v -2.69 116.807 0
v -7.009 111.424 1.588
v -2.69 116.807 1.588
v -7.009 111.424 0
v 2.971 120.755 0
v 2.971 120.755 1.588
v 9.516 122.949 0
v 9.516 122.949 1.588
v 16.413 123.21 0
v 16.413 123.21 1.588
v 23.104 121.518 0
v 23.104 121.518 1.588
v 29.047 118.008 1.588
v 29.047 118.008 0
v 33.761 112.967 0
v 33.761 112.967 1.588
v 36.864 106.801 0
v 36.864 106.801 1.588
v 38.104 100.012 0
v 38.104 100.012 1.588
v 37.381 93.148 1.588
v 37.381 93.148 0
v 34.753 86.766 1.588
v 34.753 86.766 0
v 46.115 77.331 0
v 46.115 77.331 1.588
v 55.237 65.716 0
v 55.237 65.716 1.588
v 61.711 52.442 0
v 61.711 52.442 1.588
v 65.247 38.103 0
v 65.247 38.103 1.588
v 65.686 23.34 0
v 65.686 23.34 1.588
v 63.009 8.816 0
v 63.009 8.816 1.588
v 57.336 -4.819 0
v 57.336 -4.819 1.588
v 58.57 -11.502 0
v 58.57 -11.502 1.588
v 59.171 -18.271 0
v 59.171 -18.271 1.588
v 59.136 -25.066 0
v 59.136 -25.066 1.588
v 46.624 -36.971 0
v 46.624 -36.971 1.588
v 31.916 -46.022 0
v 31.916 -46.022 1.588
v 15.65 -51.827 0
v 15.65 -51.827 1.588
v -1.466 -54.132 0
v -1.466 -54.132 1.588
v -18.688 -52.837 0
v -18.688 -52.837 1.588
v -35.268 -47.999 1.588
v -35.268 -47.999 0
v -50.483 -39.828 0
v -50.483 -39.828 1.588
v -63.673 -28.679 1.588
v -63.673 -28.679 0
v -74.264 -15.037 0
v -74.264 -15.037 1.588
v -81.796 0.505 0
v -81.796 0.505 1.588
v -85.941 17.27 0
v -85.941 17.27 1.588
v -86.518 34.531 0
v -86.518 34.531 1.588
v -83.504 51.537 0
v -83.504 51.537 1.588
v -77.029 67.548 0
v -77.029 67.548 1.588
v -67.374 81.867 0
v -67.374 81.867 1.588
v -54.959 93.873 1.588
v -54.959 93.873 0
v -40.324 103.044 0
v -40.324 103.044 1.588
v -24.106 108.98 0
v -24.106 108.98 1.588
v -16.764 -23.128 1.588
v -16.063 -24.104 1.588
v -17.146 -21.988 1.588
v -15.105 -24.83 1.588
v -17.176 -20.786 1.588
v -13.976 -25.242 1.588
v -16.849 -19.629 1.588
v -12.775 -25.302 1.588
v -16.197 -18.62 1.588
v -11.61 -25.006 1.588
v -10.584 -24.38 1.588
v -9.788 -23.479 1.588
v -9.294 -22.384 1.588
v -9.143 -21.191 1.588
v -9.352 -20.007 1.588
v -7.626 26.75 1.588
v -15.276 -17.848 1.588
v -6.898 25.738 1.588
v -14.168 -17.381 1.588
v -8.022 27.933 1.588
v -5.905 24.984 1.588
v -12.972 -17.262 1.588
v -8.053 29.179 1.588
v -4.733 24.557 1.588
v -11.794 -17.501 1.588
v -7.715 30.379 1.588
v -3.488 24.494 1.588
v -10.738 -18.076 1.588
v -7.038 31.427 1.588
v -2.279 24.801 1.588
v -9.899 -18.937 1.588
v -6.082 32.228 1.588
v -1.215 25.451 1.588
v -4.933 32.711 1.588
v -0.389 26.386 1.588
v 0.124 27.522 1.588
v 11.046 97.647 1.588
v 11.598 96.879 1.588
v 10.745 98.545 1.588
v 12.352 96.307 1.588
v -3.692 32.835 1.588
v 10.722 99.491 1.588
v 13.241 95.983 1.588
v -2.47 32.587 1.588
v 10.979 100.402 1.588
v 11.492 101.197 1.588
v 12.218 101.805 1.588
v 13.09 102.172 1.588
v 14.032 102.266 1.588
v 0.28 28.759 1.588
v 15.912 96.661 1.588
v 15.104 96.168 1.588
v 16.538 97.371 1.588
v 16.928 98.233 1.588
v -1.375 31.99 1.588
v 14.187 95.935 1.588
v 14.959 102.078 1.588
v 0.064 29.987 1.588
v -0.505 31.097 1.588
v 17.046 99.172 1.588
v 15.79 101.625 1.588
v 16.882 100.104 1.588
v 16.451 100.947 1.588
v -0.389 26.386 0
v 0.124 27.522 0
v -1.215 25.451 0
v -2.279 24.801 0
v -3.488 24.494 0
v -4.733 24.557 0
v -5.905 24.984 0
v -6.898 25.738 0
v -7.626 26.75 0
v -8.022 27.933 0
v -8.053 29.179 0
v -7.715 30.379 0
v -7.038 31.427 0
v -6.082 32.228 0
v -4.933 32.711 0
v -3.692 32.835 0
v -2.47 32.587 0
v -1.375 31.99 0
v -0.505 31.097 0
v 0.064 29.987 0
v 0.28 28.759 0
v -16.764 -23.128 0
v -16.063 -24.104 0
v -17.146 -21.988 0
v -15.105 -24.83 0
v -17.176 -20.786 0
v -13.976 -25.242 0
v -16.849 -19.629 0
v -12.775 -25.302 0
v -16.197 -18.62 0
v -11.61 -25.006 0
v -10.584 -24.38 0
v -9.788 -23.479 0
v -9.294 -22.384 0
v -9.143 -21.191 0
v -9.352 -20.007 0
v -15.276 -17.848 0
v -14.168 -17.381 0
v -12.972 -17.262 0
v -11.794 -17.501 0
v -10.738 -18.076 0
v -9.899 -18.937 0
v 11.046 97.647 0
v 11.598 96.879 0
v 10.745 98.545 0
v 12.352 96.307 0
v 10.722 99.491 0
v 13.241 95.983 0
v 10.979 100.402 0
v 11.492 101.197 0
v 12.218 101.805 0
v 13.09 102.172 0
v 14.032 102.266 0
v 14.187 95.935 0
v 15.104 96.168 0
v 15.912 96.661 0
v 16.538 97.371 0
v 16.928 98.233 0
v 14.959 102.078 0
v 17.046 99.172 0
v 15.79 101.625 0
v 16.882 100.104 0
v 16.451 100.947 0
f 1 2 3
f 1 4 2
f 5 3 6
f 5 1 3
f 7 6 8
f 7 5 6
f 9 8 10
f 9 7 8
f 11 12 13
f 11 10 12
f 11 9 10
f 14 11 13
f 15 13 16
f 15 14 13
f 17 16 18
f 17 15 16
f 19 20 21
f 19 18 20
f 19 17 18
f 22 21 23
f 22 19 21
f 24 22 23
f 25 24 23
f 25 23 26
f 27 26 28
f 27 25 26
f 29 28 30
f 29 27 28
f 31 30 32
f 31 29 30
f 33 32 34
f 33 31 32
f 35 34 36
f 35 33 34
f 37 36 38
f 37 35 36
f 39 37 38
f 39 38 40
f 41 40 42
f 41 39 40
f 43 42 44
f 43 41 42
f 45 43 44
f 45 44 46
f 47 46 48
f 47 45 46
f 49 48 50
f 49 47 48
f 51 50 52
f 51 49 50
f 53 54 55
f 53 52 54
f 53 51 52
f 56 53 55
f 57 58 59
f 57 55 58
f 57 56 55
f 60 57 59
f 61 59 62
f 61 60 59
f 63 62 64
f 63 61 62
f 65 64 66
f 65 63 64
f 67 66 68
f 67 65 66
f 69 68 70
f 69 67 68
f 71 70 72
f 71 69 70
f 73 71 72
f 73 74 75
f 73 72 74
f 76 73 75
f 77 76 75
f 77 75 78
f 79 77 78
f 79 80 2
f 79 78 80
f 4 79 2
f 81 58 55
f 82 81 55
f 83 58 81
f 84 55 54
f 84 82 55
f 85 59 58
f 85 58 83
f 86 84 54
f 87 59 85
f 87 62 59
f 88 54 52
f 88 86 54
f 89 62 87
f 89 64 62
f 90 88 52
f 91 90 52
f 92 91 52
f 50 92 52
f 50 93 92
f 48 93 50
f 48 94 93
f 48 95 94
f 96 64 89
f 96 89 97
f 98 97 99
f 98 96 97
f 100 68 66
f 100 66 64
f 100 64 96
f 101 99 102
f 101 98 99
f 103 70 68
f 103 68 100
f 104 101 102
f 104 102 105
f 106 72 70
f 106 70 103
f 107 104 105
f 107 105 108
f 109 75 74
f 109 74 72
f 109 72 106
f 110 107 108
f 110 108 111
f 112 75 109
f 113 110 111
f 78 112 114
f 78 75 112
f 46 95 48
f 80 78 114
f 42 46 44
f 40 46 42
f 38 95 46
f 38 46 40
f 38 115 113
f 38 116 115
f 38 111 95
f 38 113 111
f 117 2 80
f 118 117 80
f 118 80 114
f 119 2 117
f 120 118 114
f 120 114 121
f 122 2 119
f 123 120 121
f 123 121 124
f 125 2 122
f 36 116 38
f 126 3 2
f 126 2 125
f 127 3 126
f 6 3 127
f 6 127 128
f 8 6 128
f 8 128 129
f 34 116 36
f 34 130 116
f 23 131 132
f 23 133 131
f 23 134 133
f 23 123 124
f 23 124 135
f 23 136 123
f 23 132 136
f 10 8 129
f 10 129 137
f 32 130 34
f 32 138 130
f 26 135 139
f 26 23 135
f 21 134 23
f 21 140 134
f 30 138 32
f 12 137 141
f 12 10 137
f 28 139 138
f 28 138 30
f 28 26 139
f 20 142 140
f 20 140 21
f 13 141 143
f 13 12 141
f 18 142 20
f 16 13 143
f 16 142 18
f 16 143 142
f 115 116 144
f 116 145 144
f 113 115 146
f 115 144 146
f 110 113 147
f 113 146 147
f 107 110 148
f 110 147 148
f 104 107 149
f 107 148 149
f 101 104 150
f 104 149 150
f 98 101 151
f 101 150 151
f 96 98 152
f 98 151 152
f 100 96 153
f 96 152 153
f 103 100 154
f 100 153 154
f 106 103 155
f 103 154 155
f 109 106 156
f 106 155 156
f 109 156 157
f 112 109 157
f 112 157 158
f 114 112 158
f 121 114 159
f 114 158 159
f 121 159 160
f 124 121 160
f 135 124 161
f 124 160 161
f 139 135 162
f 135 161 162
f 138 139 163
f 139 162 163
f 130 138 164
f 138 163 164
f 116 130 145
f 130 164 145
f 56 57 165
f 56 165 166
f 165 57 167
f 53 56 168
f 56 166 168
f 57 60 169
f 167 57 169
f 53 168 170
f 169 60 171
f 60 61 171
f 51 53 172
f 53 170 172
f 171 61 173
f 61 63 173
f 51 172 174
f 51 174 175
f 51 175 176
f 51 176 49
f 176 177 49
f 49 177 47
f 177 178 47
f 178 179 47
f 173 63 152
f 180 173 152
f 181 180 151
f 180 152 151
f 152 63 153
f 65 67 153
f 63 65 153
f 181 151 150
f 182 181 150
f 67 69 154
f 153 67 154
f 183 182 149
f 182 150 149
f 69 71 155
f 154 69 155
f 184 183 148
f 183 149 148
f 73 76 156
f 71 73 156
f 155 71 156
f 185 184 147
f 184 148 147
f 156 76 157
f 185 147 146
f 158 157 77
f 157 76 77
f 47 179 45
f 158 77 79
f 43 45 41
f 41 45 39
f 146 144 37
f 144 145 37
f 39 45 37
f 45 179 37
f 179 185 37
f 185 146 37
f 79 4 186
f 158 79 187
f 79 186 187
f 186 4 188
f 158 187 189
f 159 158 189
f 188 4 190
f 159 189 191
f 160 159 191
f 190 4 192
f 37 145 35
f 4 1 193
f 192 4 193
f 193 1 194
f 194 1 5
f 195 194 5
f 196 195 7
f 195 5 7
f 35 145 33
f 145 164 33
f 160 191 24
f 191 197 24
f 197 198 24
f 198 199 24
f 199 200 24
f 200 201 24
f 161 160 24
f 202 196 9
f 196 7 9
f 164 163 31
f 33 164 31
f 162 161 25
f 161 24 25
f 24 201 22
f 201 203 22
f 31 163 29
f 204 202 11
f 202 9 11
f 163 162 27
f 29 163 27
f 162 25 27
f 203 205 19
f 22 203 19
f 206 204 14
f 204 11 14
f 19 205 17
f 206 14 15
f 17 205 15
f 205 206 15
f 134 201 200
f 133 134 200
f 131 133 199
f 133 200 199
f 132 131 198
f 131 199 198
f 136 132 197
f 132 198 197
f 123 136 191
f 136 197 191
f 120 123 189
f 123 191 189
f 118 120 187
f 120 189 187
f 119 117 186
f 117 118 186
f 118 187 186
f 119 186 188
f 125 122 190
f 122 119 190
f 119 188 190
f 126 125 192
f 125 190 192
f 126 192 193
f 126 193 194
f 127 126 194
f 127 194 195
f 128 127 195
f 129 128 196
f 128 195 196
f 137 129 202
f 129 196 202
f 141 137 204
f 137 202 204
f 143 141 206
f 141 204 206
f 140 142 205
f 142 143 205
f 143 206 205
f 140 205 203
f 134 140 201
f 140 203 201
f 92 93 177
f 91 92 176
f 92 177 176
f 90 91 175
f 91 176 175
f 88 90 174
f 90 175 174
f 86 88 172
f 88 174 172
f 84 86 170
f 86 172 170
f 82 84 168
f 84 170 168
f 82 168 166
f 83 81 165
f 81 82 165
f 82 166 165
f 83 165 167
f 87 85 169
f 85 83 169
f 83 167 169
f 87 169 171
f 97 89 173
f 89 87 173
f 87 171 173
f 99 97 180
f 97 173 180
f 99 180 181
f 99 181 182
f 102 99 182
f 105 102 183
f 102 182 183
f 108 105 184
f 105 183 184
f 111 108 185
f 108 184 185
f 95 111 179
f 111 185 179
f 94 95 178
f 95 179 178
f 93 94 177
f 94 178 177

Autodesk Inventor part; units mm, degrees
ref_plane "YZ Plane" through (0, 0, 0) normal (1, 0, 0) x (0, 1, 0)
ref_plane "XZ Plane" through (0, 0, 0) normal (0, 1, 0) x (-1, 0, 0)
ref_plane "XY Plane" through (0, 0, 0) normal (0, 0, 1) x (1, 0, 0)
ref_plane "Work Plane1" through (-99.6499, 20.9204, 0) normal (0, 0, 1) x (0.9625, -0.2713, 0)
sketch "Sketch1" plane through (-99.6499, 20.9204, 0) normal (0, 0, 1) x (0.9625, -0.2713, 0)
  arc A0 (85.2738, 81.502) -> (83.0074, 84.6783) centre (85.432, 84.0117) ccw construction
  circle A1 centre (88.0557, 106.0406) radius 3.175
  arc A2 (111.4983, 99.8389) -> (64.6131, 112.2422) centre (88.0557, 106.0406) ccw
  circle A3 centre (90.0577, 33.4227) radius 3.175 construction
  circle A4 centre (94.6835, -17.1663) radius 3.175 construction
  arc A5 (165.3065, -1.1832) -> (158.0816, 17.8159) centre (94.6835, -17.1663) ccw
  circle A6 centre (90.0577, 33.4227) radius 4.1833
  circle A7 centre (94.6835, -17.1663) radius 4.0324
  arc A8 (158.0816, 17.8159) -> (111.4983, 99.8389) centre (90.0577, 33.4227) ccw
  arc A9 (64.6131, 112.2422) -> (165.3065, -1.1832) centre (90.0577, 33.4227) ccw
  point P0 (101.5885, 6.8942)
  dimension "d0" = 6.35
extrude "Extrusion1" add sketch "Sketch1" along normal blind 1.5875
properties part number "driveGearSupportLayer"
